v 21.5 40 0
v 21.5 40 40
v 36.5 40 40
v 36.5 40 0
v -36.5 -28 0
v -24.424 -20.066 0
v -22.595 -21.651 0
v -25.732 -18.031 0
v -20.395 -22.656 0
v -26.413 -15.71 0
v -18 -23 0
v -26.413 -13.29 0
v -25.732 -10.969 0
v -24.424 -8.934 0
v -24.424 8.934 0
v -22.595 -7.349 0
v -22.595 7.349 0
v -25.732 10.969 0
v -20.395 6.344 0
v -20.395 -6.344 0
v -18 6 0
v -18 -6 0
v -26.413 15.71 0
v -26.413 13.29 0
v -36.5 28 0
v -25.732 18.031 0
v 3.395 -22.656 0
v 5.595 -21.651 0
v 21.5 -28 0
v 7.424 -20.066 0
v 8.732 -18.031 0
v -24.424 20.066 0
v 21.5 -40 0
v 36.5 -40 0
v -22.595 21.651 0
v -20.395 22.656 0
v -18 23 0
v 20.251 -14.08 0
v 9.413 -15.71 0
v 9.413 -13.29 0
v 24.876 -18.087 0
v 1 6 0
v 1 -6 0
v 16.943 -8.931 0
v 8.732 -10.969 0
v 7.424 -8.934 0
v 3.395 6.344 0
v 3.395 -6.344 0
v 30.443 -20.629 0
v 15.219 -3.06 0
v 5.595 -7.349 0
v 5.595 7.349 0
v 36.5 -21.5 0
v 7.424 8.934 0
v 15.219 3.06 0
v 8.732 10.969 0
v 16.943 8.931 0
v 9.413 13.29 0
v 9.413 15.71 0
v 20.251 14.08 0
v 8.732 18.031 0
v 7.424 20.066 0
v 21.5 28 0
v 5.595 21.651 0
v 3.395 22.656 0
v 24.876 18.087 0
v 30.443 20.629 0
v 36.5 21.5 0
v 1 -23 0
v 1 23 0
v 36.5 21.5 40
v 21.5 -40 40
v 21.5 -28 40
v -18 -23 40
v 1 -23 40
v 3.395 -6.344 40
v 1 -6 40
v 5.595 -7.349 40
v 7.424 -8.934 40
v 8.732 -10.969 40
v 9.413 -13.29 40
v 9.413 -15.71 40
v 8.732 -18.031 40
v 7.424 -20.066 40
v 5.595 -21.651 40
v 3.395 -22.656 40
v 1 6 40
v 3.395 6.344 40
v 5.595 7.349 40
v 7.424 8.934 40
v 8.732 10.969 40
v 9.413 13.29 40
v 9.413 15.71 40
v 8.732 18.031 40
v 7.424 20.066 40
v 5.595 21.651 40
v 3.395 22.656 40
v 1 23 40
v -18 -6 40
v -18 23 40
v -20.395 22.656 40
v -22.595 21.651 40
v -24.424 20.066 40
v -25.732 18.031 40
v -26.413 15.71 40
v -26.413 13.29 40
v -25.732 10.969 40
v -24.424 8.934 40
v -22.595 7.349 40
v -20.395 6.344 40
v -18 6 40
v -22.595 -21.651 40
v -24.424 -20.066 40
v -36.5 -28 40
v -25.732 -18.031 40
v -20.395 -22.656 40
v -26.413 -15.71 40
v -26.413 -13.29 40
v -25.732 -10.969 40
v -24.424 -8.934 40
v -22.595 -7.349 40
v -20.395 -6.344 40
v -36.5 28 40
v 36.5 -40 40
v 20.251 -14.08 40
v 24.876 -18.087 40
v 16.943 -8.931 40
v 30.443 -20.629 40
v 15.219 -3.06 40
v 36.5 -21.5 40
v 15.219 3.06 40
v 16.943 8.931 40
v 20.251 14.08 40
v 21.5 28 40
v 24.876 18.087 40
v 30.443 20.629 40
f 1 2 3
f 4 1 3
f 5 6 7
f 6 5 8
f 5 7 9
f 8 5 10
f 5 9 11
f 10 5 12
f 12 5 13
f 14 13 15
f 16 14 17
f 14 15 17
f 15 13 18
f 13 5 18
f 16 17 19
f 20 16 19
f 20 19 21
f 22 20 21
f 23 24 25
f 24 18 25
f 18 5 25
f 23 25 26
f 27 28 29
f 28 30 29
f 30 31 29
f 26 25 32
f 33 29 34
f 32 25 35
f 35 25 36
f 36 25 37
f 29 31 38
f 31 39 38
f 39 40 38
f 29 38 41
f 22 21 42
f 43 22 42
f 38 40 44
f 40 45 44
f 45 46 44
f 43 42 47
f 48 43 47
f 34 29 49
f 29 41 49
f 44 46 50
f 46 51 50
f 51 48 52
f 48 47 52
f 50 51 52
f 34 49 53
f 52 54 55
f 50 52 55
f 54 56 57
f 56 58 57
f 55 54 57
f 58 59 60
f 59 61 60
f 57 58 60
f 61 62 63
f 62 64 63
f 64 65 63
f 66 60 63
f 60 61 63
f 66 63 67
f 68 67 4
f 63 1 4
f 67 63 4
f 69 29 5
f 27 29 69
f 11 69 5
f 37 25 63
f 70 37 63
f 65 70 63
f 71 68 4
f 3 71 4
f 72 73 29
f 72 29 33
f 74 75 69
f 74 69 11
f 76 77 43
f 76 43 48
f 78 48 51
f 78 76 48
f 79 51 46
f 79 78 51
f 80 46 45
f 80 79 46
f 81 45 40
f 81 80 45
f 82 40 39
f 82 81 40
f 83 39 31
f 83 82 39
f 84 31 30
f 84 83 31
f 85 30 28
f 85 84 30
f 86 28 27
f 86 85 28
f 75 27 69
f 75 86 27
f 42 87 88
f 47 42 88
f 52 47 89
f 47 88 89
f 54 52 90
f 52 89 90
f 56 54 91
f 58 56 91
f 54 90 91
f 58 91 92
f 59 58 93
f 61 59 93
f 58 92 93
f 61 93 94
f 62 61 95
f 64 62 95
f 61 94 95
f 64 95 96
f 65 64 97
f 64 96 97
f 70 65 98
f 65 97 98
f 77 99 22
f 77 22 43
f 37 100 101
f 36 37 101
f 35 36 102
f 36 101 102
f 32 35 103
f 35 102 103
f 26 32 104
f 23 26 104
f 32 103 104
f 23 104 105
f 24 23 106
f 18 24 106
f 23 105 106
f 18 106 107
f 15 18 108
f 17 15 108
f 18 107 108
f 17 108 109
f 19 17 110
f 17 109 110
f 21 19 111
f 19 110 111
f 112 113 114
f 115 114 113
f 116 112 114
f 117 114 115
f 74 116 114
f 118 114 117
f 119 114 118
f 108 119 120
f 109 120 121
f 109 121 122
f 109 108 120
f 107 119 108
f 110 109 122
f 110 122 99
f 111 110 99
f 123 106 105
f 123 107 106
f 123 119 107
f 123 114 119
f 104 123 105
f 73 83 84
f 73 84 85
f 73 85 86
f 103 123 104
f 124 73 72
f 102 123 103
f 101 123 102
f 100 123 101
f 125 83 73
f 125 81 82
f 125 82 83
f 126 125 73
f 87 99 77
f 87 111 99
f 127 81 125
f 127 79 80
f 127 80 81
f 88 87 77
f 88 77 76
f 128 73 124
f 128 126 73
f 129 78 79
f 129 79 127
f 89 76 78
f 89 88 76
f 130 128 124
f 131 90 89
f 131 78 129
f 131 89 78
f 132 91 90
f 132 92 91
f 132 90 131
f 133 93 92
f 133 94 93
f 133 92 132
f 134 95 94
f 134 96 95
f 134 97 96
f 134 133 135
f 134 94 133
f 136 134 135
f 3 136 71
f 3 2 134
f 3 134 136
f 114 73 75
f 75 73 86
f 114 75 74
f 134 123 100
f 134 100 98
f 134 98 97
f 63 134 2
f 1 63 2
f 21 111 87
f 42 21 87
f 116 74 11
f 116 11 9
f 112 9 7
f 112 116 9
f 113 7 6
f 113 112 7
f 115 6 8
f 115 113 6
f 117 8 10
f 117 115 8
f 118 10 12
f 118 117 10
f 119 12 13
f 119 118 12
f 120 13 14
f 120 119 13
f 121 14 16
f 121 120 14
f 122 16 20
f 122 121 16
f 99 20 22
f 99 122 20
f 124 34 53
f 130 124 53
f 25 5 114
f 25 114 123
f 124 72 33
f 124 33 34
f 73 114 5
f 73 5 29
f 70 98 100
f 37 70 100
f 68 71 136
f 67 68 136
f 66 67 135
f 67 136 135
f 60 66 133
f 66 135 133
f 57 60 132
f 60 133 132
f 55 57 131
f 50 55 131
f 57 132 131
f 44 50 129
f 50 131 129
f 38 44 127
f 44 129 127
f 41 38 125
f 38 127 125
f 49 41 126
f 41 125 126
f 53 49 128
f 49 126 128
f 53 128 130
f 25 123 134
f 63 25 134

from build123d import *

# Parameters (mm, degrees)
SKETCH_1_W          = 73
SKETCH_1_H          = 80
EXTRUDE_1_DEPTH     = 40
SKETCH_2_R          = 21.5
CUT_EXTRUDE_1_DEPTH = 68.321987493
SKETCH_3_W          = 58
SKETCH_3_H          = 12
CUT_EXTRUDE_5_DEPTH = 68.321987493


with BuildPart() as part:
    # Эскиз1 → Бобышка-Вытянуть1 (new body)
    with BuildSketch(Plane.XY):
        Rectangle(SKETCH_1_W, SKETCH_1_H)
    extrude(amount=EXTRUDE_1_DEPTH)

    # Эскиз2 → Вырез-Вытянуть1 (cut, through all)
    with BuildSketch(Plane.XY.offset(40)):
        with Locations((36.5, 0)):
            Circle(SKETCH_2_R)
        with BuildLine():
            Line((-18, -6), (1, -6))
            ThreePointArc((1, -6), (9.5, -14.5), (1, -23))
            Line((1, -23), (-18, -23))
            ThreePointArc((-18, -23), (-26.5, -14.5), (-18, -6))
        make_face()
        with BuildLine():
            Line((-18, 6), (1, 6))
            ThreePointArc((1, 6), (9.5, 14.5), (1, 23))
            Line((1, 23), (-18, 23))
            ThreePointArc((-18, 23), (-26.5, 14.5), (-18, 6))
        make_face()
    extrude(amount=-CUT_EXTRUDE_1_DEPTH, mode=Mode.SUBTRACT)

    # Эскиз3 → Вырез-Вытянуть5 (cut, through all)
    with BuildSketch(Plane.XY.offset(40)):
        with Locations((-7.5, 34)):
            Rectangle(SKETCH_3_W, SKETCH_3_H)
    cut_extrude_5 = extrude(amount=-CUT_EXTRUDE_5_DEPTH, mode=Mode.SUBTRACT)

    # Зеркальное отражение1: Вырез-Вытянуть5 across plane
    add(cut_extrude_5.mirror(Plane.ZX), mode=Mode.SUBTRACT)


solid = part.part
